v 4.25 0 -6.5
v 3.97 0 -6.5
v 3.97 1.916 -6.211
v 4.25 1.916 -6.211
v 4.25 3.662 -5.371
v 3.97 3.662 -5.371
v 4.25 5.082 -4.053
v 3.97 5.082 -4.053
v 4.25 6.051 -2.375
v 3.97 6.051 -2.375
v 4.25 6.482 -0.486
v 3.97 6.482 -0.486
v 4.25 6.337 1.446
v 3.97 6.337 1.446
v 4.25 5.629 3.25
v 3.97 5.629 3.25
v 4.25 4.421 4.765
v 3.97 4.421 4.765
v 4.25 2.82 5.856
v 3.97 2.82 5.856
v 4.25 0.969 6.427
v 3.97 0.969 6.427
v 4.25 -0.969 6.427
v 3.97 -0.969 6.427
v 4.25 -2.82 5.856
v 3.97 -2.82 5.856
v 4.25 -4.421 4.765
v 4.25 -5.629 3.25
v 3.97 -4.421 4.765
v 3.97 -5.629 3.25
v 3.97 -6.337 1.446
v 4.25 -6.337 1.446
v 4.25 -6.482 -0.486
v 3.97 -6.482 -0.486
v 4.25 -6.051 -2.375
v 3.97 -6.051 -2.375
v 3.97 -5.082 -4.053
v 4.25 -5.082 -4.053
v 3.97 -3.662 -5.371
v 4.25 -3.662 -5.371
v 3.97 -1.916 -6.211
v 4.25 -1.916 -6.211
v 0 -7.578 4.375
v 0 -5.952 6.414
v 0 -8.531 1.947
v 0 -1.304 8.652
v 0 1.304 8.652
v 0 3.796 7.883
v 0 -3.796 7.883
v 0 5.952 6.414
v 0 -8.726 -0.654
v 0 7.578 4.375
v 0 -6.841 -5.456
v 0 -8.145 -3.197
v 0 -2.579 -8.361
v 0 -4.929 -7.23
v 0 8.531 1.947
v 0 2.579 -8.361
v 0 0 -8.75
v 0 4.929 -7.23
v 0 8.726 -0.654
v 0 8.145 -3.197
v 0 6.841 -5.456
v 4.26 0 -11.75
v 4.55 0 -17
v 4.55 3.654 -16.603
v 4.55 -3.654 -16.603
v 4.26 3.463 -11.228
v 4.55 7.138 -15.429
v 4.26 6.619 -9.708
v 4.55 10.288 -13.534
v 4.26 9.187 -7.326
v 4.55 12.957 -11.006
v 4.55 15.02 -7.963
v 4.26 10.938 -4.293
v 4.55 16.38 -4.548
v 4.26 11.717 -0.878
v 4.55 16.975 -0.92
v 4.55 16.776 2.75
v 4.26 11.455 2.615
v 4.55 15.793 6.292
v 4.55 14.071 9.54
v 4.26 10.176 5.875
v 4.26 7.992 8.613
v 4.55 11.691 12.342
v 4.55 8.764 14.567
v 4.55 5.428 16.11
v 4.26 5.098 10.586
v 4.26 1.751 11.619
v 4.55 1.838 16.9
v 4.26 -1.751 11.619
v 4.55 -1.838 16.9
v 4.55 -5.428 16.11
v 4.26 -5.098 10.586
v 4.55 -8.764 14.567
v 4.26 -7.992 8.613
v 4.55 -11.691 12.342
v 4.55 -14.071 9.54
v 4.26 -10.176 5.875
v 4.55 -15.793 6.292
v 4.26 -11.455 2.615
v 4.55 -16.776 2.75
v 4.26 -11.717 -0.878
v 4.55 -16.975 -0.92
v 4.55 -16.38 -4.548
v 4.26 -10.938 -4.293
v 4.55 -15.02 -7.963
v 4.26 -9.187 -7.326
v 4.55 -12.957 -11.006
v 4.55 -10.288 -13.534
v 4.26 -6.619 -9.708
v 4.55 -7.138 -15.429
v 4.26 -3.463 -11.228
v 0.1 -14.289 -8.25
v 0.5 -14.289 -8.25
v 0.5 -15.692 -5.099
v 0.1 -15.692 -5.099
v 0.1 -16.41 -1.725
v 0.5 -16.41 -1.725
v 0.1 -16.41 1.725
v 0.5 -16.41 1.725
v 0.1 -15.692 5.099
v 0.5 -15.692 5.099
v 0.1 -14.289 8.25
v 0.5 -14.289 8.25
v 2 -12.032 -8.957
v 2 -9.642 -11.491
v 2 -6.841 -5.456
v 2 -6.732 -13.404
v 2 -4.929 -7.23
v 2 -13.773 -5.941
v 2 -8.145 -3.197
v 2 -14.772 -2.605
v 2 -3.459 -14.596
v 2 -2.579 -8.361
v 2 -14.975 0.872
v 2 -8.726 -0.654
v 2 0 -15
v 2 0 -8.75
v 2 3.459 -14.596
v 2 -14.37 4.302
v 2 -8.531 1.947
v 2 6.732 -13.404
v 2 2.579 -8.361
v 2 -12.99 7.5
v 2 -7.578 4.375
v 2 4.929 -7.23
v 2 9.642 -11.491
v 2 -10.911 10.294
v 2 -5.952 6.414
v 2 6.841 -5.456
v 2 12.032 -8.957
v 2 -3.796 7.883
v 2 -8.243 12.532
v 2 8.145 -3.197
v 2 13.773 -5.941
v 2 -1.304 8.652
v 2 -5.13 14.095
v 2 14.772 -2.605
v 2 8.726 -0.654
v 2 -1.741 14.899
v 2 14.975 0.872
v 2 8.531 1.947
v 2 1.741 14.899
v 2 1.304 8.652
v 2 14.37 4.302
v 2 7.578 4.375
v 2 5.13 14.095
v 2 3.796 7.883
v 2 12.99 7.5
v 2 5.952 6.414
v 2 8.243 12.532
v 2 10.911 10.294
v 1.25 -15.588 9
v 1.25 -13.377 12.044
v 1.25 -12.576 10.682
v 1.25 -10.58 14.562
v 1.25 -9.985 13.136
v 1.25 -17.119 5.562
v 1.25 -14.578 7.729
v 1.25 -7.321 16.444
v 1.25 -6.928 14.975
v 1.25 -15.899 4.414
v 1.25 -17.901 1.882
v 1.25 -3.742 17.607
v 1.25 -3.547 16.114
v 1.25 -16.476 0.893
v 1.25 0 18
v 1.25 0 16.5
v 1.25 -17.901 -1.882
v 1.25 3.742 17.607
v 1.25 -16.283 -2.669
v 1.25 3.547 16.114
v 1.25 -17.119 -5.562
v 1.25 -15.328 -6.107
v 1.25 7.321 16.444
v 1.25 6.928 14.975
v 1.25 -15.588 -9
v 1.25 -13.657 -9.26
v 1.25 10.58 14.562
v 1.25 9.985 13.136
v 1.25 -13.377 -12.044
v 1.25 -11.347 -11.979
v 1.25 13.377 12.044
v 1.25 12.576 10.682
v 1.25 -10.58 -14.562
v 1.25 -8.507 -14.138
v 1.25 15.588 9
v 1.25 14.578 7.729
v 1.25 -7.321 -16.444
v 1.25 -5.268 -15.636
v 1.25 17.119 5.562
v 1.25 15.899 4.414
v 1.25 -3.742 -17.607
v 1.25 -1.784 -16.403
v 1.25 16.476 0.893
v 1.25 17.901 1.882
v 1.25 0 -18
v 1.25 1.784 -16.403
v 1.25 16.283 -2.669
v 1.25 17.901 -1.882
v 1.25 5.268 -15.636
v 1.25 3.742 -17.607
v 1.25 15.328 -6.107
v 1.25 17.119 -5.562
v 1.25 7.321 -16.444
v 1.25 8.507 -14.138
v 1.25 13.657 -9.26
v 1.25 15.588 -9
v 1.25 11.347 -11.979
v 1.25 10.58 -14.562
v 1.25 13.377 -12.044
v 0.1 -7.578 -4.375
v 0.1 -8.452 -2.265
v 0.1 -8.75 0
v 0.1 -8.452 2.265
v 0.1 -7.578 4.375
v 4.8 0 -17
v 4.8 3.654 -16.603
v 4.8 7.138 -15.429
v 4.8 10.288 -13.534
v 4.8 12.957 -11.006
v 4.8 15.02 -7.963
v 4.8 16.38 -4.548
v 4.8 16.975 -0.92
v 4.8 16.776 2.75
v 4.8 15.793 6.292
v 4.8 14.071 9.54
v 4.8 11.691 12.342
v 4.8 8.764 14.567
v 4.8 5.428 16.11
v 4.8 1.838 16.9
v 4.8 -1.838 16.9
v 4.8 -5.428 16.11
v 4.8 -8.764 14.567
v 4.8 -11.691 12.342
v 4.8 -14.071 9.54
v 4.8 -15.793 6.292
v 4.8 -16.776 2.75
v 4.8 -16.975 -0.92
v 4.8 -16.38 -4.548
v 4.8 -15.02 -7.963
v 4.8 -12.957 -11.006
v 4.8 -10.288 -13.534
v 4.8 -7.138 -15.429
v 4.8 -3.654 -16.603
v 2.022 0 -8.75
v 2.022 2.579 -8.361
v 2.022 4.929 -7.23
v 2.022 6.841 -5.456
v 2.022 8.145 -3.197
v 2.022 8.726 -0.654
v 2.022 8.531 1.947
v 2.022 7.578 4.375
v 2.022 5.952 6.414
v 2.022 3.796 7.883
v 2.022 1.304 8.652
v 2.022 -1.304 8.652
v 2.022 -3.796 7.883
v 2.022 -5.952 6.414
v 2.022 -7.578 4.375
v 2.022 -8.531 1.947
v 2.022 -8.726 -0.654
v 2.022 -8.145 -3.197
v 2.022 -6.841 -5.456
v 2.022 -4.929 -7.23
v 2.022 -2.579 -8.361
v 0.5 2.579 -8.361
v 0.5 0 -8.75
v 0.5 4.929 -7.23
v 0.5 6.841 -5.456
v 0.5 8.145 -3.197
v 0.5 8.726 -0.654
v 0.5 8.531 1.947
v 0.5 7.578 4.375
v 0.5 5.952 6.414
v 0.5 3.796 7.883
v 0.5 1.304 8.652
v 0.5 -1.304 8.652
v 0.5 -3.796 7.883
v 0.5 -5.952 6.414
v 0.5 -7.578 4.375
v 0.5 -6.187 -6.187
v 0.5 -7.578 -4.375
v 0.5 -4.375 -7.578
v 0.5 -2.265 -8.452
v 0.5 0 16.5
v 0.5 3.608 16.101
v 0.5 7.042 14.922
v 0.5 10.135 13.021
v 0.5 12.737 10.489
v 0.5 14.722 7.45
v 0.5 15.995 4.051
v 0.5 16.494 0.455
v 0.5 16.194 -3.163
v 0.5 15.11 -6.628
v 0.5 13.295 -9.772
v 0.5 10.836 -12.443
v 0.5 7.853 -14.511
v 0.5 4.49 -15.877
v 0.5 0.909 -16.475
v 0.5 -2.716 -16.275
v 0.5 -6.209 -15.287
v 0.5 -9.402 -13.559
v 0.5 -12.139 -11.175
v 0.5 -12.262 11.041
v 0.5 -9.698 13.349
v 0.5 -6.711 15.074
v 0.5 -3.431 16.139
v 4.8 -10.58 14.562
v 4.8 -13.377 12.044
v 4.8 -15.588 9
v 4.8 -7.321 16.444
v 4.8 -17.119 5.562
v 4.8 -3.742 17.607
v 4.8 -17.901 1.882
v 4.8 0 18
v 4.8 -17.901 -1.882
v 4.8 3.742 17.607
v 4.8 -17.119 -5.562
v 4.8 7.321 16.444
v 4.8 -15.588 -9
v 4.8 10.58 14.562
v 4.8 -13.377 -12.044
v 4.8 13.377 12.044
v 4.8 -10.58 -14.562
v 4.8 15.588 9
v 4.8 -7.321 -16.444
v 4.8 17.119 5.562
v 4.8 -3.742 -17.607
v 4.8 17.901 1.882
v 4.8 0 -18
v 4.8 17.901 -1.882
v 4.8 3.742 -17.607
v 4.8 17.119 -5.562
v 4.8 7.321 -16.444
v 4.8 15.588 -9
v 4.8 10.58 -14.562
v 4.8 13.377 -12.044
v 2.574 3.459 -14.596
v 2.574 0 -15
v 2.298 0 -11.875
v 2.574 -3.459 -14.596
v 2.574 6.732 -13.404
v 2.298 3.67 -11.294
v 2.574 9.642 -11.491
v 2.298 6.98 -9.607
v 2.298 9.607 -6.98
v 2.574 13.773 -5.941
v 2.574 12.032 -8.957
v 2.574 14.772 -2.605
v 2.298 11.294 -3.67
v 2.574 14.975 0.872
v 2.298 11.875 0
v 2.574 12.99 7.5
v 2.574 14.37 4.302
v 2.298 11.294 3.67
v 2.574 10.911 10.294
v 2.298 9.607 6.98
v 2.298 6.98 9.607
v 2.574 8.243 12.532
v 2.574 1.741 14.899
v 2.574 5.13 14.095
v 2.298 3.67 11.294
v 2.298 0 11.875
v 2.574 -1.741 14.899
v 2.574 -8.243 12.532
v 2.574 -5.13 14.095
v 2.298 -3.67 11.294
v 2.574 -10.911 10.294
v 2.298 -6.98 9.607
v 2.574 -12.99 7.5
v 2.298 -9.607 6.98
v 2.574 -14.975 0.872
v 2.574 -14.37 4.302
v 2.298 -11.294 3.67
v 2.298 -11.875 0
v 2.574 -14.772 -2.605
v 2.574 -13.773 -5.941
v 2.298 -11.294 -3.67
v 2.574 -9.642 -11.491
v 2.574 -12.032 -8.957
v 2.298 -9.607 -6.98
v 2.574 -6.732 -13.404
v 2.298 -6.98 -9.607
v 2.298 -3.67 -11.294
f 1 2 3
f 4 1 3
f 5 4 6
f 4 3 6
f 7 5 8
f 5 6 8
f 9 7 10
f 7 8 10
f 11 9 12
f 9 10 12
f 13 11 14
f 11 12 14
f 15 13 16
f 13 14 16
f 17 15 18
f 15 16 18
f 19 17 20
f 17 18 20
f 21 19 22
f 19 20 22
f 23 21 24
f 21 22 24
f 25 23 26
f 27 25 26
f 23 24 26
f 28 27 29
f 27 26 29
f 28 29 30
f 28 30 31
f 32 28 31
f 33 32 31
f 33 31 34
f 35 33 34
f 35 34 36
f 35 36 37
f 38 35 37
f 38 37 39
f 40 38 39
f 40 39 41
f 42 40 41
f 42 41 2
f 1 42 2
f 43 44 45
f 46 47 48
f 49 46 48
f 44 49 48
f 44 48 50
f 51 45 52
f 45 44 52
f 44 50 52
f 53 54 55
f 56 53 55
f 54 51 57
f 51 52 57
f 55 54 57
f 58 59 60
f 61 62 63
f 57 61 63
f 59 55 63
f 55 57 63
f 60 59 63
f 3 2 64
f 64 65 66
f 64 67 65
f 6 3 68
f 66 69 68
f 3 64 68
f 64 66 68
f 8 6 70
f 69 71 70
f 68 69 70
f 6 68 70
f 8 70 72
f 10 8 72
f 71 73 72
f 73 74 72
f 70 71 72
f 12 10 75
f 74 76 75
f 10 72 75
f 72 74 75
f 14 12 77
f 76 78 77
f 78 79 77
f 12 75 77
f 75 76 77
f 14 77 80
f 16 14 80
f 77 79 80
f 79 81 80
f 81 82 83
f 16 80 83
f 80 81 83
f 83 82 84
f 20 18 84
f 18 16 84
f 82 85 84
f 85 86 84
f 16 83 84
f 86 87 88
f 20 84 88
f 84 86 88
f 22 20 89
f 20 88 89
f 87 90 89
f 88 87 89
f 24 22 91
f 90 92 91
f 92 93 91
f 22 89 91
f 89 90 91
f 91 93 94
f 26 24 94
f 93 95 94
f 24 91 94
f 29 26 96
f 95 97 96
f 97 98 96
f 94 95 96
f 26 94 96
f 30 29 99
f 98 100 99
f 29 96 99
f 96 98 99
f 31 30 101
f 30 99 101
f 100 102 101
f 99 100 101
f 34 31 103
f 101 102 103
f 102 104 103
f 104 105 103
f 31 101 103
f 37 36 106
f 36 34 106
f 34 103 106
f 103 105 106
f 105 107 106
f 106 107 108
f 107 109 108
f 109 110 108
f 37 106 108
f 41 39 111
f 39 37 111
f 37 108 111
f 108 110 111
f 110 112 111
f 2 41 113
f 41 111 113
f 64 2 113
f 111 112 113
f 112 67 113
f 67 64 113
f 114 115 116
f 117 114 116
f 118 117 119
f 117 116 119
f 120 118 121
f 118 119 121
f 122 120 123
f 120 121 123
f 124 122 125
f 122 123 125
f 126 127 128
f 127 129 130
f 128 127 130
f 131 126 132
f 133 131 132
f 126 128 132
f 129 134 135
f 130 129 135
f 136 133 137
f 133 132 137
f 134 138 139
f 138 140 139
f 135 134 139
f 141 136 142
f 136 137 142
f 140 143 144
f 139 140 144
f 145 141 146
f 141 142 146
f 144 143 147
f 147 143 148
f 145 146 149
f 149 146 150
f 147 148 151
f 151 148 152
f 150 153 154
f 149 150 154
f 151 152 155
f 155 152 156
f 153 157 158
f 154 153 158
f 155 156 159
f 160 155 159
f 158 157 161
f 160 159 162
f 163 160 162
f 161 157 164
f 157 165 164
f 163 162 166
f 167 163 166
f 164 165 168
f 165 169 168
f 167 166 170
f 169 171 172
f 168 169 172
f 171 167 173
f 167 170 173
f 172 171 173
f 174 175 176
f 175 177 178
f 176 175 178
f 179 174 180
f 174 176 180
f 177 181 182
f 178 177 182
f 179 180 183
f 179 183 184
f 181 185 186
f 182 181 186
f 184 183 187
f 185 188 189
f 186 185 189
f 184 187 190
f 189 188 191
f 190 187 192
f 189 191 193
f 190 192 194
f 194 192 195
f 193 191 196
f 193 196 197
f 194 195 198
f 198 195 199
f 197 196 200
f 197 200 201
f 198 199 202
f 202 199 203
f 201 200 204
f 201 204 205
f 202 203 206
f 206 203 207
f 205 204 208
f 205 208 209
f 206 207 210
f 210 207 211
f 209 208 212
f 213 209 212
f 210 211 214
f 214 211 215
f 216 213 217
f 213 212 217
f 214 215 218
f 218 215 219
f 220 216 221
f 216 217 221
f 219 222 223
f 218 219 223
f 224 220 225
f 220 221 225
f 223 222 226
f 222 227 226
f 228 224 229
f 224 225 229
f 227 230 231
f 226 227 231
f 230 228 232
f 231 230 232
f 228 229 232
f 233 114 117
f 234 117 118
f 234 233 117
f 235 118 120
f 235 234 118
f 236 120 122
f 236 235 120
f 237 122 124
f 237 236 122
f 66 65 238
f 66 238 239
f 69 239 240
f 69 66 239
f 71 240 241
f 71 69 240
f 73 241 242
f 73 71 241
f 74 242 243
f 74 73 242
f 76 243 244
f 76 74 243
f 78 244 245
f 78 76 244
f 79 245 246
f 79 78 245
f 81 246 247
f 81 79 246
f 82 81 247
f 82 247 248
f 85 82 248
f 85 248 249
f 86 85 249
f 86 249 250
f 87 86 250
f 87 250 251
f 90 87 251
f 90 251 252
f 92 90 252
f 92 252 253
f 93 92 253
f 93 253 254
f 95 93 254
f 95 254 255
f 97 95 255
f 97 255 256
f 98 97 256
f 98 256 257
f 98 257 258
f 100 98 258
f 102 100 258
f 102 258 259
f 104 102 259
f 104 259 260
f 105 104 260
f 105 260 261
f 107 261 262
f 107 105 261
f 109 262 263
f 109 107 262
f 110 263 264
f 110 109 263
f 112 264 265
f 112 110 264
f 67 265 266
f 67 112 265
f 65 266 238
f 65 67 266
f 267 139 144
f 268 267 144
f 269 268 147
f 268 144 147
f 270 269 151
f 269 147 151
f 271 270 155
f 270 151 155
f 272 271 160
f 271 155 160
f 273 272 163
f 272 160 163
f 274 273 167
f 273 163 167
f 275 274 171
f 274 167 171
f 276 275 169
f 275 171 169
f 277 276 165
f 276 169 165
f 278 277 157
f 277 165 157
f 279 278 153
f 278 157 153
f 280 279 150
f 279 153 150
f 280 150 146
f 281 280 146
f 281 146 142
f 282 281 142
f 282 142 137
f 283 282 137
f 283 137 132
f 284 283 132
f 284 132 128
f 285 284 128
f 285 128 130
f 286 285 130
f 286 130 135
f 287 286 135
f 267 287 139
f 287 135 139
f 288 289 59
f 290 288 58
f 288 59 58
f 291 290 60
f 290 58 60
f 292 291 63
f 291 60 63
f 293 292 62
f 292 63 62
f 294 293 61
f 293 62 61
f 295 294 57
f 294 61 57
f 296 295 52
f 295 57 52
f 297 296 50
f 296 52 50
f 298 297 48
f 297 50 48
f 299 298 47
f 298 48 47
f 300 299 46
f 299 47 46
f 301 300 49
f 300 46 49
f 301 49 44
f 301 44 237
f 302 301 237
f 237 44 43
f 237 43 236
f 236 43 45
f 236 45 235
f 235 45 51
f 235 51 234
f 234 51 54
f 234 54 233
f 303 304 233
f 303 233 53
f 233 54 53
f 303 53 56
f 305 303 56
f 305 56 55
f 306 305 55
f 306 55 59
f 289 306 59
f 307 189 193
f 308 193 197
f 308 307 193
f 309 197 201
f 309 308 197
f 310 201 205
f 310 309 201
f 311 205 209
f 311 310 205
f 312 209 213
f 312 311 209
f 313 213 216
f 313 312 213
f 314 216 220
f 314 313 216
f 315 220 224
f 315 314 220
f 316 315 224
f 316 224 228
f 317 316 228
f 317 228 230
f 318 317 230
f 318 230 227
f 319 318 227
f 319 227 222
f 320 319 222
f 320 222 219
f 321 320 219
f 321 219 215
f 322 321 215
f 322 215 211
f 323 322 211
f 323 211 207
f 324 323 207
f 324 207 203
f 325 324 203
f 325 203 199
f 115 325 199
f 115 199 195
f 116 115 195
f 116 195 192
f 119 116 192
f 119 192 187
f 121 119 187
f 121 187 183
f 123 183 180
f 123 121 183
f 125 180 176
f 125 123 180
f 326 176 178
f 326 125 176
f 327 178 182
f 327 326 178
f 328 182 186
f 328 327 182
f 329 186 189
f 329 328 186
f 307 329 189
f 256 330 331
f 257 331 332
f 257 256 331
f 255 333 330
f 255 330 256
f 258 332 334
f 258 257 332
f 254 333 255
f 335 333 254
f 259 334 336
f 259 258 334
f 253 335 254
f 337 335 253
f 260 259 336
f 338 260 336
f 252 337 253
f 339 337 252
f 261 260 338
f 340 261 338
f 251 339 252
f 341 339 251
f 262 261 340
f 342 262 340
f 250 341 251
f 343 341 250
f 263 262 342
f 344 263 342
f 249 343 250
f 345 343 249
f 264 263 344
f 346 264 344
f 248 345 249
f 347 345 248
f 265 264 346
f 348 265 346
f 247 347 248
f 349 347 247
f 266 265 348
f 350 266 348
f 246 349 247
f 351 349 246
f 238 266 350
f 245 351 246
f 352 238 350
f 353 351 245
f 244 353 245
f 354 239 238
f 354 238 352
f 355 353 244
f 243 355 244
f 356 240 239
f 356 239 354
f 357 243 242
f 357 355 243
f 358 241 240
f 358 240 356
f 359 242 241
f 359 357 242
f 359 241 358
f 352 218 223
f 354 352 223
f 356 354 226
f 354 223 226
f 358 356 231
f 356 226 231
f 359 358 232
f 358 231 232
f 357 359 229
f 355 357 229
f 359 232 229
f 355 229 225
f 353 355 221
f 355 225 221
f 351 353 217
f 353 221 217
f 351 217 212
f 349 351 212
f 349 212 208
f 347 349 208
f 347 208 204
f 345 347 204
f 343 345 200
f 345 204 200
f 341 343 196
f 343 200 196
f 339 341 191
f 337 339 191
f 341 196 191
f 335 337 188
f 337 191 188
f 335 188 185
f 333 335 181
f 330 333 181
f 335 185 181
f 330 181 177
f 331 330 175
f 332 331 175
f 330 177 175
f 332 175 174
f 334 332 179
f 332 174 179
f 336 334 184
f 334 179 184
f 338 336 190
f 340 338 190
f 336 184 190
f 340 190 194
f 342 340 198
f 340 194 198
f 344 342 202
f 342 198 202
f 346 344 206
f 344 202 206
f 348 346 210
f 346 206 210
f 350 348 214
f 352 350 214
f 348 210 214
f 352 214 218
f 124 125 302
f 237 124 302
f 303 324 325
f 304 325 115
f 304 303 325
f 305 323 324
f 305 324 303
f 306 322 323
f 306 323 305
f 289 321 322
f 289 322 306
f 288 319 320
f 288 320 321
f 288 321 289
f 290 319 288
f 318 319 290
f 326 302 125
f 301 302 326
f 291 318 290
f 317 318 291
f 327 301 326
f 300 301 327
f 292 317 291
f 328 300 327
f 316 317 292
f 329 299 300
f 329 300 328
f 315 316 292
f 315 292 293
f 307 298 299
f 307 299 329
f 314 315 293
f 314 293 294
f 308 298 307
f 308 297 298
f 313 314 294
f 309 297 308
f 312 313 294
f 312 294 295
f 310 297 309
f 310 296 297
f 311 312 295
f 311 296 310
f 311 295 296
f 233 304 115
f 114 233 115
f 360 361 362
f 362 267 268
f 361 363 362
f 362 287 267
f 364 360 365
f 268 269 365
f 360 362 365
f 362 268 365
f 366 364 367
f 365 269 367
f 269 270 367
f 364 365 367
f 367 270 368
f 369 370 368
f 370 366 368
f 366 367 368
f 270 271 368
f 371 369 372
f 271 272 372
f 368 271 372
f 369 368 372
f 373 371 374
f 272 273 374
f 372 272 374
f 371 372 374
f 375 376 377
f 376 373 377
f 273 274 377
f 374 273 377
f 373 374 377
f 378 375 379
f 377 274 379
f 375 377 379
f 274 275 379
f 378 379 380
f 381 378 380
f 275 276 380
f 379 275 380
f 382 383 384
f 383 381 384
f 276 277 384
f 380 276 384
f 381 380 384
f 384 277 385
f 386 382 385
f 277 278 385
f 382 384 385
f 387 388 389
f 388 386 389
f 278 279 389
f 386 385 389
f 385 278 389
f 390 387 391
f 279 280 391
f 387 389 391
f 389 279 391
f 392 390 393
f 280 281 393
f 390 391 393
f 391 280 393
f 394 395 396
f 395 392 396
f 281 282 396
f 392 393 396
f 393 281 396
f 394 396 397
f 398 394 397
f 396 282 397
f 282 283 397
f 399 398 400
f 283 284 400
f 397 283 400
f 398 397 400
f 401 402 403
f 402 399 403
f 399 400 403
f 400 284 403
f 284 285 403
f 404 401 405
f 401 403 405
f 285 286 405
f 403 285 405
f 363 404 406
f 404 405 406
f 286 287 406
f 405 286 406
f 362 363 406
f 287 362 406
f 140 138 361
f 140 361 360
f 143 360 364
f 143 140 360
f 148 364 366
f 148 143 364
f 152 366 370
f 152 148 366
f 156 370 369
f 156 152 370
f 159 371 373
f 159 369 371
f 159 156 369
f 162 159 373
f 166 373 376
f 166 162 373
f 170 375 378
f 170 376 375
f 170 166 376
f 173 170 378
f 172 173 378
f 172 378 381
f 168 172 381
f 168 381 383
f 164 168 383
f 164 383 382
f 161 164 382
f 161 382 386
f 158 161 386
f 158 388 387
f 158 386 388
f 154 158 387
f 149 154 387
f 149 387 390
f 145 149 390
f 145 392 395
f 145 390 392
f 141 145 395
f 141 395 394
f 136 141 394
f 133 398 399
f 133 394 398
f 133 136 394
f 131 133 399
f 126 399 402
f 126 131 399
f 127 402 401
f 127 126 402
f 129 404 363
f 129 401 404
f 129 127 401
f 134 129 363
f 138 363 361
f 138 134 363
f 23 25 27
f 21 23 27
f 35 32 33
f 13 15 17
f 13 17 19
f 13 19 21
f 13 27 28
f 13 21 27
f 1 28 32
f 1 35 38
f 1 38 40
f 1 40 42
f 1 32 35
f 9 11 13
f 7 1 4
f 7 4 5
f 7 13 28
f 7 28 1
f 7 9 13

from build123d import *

# Parameters (mm, degrees)
SKETCH2_R           = 8.75
BOSS_EXTRUDE2_DEPTH = 3.5
SKETCH3_R           = 16.5
BOSS_EXTRUDE3_DEPTH = 1.5
SKETCH5_R           = 18
SKETCH5_R_2         = 17
BOSS_EXTRUDE4_DEPTH = 3.55
SKETCH6_R           = 17
SKETCH6_R_2         = 15
BOSS_EXTRUDE5_DEPTH = 1.5
SKETCH8_R           = 6.5
BOSS_EXTRUDE6_DEPTH = 0.75
BOSS_EXTRUDE7_DEPTH = 0.4


with BuildPart() as part:
    # Sketch2 → Boss-Extrude2 (new body)
    with BuildSketch(Plane(origin=(0, 0, 0), x_dir=(0, 0, -1), z_dir=(1, 0, 0))):
        Circle(SKETCH2_R)
    extrude(amount=BOSS_EXTRUDE2_DEPTH)

    # Sketch3 → Boss-Extrude3 (add)
    with BuildSketch(Plane.ZY.offset(-0.5)):
        Circle(SKETCH3_R)
    extrude(amount=-BOSS_EXTRUDE3_DEPTH)



with BuildPart() as body_2:
    # Sketch5 → Boss-Extrude4 (new body)
    with BuildSketch(Plane(origin=(1.25, 0, 0), x_dir=(0, 0, -1), z_dir=(1, 0, 0))):
        Circle(SKETCH5_R)
        Circle(SKETCH5_R_2, mode=Mode.SUBTRACT)
    extrude(amount=BOSS_EXTRUDE4_DEPTH)


with BuildPart() as part_1:
    add(part.part)

    add(body_2.part)  # Boss-Extrude5 merges body 2
    # Sketch6 → Boss-Extrude5 (add)
    with BuildSketch(Plane(origin=(1.25, 0, 0), x_dir=(0, 0, -1), z_dir=(1, 0, 0))):
        Circle(SKETCH6_R)
        Circle(SKETCH6_R_2, mode=Mode.SUBTRACT)
    extrude(amount=BOSS_EXTRUDE5_DEPTH)

    # Sketch8 → Boss-Extrude6 (add)
    with BuildSketch(Plane(origin=(3.5, 0, 0), x_dir=(0, 0, -1), z_dir=(1, 0, 0))):
        Circle(SKETCH8_R)
    extrude(amount=BOSS_EXTRUDE6_DEPTH)

    # Sketch10 → Revolve1 (revolve)
    with BuildSketch(Plane(origin=(0, 0, 0), x_dir=(1, 0, 0), z_dir=(0, 1, 0))):
        Polygon((1.25, 0), (3.611187211, 0), (4.55, 17), (2.75, 17), align=None)
    revolve(axis=Axis((1.25, 0, 0), (1, 0, 0)))

    # Sketch11 → Boss-Extrude7 (add)
    with BuildSketch(Plane.ZY.offset(-0.5)):
        with BuildLine():
            Line((8.25, -14.289419162), (4.375, -7.577722283))
            ThreePointArc((4.375, -7.577722283), (0, -8.75), (-4.375, -7.577722283))
            Line((-4.375, -7.577722283), (-8.25, -14.289419162))
            ThreePointArc((-8.25, -14.289419162), (0, -16.5), (8.25, -14.289419162))
        make_face()
    extrude(amount=BOSS_EXTRUDE7_DEPTH)


solid = part_1.part
